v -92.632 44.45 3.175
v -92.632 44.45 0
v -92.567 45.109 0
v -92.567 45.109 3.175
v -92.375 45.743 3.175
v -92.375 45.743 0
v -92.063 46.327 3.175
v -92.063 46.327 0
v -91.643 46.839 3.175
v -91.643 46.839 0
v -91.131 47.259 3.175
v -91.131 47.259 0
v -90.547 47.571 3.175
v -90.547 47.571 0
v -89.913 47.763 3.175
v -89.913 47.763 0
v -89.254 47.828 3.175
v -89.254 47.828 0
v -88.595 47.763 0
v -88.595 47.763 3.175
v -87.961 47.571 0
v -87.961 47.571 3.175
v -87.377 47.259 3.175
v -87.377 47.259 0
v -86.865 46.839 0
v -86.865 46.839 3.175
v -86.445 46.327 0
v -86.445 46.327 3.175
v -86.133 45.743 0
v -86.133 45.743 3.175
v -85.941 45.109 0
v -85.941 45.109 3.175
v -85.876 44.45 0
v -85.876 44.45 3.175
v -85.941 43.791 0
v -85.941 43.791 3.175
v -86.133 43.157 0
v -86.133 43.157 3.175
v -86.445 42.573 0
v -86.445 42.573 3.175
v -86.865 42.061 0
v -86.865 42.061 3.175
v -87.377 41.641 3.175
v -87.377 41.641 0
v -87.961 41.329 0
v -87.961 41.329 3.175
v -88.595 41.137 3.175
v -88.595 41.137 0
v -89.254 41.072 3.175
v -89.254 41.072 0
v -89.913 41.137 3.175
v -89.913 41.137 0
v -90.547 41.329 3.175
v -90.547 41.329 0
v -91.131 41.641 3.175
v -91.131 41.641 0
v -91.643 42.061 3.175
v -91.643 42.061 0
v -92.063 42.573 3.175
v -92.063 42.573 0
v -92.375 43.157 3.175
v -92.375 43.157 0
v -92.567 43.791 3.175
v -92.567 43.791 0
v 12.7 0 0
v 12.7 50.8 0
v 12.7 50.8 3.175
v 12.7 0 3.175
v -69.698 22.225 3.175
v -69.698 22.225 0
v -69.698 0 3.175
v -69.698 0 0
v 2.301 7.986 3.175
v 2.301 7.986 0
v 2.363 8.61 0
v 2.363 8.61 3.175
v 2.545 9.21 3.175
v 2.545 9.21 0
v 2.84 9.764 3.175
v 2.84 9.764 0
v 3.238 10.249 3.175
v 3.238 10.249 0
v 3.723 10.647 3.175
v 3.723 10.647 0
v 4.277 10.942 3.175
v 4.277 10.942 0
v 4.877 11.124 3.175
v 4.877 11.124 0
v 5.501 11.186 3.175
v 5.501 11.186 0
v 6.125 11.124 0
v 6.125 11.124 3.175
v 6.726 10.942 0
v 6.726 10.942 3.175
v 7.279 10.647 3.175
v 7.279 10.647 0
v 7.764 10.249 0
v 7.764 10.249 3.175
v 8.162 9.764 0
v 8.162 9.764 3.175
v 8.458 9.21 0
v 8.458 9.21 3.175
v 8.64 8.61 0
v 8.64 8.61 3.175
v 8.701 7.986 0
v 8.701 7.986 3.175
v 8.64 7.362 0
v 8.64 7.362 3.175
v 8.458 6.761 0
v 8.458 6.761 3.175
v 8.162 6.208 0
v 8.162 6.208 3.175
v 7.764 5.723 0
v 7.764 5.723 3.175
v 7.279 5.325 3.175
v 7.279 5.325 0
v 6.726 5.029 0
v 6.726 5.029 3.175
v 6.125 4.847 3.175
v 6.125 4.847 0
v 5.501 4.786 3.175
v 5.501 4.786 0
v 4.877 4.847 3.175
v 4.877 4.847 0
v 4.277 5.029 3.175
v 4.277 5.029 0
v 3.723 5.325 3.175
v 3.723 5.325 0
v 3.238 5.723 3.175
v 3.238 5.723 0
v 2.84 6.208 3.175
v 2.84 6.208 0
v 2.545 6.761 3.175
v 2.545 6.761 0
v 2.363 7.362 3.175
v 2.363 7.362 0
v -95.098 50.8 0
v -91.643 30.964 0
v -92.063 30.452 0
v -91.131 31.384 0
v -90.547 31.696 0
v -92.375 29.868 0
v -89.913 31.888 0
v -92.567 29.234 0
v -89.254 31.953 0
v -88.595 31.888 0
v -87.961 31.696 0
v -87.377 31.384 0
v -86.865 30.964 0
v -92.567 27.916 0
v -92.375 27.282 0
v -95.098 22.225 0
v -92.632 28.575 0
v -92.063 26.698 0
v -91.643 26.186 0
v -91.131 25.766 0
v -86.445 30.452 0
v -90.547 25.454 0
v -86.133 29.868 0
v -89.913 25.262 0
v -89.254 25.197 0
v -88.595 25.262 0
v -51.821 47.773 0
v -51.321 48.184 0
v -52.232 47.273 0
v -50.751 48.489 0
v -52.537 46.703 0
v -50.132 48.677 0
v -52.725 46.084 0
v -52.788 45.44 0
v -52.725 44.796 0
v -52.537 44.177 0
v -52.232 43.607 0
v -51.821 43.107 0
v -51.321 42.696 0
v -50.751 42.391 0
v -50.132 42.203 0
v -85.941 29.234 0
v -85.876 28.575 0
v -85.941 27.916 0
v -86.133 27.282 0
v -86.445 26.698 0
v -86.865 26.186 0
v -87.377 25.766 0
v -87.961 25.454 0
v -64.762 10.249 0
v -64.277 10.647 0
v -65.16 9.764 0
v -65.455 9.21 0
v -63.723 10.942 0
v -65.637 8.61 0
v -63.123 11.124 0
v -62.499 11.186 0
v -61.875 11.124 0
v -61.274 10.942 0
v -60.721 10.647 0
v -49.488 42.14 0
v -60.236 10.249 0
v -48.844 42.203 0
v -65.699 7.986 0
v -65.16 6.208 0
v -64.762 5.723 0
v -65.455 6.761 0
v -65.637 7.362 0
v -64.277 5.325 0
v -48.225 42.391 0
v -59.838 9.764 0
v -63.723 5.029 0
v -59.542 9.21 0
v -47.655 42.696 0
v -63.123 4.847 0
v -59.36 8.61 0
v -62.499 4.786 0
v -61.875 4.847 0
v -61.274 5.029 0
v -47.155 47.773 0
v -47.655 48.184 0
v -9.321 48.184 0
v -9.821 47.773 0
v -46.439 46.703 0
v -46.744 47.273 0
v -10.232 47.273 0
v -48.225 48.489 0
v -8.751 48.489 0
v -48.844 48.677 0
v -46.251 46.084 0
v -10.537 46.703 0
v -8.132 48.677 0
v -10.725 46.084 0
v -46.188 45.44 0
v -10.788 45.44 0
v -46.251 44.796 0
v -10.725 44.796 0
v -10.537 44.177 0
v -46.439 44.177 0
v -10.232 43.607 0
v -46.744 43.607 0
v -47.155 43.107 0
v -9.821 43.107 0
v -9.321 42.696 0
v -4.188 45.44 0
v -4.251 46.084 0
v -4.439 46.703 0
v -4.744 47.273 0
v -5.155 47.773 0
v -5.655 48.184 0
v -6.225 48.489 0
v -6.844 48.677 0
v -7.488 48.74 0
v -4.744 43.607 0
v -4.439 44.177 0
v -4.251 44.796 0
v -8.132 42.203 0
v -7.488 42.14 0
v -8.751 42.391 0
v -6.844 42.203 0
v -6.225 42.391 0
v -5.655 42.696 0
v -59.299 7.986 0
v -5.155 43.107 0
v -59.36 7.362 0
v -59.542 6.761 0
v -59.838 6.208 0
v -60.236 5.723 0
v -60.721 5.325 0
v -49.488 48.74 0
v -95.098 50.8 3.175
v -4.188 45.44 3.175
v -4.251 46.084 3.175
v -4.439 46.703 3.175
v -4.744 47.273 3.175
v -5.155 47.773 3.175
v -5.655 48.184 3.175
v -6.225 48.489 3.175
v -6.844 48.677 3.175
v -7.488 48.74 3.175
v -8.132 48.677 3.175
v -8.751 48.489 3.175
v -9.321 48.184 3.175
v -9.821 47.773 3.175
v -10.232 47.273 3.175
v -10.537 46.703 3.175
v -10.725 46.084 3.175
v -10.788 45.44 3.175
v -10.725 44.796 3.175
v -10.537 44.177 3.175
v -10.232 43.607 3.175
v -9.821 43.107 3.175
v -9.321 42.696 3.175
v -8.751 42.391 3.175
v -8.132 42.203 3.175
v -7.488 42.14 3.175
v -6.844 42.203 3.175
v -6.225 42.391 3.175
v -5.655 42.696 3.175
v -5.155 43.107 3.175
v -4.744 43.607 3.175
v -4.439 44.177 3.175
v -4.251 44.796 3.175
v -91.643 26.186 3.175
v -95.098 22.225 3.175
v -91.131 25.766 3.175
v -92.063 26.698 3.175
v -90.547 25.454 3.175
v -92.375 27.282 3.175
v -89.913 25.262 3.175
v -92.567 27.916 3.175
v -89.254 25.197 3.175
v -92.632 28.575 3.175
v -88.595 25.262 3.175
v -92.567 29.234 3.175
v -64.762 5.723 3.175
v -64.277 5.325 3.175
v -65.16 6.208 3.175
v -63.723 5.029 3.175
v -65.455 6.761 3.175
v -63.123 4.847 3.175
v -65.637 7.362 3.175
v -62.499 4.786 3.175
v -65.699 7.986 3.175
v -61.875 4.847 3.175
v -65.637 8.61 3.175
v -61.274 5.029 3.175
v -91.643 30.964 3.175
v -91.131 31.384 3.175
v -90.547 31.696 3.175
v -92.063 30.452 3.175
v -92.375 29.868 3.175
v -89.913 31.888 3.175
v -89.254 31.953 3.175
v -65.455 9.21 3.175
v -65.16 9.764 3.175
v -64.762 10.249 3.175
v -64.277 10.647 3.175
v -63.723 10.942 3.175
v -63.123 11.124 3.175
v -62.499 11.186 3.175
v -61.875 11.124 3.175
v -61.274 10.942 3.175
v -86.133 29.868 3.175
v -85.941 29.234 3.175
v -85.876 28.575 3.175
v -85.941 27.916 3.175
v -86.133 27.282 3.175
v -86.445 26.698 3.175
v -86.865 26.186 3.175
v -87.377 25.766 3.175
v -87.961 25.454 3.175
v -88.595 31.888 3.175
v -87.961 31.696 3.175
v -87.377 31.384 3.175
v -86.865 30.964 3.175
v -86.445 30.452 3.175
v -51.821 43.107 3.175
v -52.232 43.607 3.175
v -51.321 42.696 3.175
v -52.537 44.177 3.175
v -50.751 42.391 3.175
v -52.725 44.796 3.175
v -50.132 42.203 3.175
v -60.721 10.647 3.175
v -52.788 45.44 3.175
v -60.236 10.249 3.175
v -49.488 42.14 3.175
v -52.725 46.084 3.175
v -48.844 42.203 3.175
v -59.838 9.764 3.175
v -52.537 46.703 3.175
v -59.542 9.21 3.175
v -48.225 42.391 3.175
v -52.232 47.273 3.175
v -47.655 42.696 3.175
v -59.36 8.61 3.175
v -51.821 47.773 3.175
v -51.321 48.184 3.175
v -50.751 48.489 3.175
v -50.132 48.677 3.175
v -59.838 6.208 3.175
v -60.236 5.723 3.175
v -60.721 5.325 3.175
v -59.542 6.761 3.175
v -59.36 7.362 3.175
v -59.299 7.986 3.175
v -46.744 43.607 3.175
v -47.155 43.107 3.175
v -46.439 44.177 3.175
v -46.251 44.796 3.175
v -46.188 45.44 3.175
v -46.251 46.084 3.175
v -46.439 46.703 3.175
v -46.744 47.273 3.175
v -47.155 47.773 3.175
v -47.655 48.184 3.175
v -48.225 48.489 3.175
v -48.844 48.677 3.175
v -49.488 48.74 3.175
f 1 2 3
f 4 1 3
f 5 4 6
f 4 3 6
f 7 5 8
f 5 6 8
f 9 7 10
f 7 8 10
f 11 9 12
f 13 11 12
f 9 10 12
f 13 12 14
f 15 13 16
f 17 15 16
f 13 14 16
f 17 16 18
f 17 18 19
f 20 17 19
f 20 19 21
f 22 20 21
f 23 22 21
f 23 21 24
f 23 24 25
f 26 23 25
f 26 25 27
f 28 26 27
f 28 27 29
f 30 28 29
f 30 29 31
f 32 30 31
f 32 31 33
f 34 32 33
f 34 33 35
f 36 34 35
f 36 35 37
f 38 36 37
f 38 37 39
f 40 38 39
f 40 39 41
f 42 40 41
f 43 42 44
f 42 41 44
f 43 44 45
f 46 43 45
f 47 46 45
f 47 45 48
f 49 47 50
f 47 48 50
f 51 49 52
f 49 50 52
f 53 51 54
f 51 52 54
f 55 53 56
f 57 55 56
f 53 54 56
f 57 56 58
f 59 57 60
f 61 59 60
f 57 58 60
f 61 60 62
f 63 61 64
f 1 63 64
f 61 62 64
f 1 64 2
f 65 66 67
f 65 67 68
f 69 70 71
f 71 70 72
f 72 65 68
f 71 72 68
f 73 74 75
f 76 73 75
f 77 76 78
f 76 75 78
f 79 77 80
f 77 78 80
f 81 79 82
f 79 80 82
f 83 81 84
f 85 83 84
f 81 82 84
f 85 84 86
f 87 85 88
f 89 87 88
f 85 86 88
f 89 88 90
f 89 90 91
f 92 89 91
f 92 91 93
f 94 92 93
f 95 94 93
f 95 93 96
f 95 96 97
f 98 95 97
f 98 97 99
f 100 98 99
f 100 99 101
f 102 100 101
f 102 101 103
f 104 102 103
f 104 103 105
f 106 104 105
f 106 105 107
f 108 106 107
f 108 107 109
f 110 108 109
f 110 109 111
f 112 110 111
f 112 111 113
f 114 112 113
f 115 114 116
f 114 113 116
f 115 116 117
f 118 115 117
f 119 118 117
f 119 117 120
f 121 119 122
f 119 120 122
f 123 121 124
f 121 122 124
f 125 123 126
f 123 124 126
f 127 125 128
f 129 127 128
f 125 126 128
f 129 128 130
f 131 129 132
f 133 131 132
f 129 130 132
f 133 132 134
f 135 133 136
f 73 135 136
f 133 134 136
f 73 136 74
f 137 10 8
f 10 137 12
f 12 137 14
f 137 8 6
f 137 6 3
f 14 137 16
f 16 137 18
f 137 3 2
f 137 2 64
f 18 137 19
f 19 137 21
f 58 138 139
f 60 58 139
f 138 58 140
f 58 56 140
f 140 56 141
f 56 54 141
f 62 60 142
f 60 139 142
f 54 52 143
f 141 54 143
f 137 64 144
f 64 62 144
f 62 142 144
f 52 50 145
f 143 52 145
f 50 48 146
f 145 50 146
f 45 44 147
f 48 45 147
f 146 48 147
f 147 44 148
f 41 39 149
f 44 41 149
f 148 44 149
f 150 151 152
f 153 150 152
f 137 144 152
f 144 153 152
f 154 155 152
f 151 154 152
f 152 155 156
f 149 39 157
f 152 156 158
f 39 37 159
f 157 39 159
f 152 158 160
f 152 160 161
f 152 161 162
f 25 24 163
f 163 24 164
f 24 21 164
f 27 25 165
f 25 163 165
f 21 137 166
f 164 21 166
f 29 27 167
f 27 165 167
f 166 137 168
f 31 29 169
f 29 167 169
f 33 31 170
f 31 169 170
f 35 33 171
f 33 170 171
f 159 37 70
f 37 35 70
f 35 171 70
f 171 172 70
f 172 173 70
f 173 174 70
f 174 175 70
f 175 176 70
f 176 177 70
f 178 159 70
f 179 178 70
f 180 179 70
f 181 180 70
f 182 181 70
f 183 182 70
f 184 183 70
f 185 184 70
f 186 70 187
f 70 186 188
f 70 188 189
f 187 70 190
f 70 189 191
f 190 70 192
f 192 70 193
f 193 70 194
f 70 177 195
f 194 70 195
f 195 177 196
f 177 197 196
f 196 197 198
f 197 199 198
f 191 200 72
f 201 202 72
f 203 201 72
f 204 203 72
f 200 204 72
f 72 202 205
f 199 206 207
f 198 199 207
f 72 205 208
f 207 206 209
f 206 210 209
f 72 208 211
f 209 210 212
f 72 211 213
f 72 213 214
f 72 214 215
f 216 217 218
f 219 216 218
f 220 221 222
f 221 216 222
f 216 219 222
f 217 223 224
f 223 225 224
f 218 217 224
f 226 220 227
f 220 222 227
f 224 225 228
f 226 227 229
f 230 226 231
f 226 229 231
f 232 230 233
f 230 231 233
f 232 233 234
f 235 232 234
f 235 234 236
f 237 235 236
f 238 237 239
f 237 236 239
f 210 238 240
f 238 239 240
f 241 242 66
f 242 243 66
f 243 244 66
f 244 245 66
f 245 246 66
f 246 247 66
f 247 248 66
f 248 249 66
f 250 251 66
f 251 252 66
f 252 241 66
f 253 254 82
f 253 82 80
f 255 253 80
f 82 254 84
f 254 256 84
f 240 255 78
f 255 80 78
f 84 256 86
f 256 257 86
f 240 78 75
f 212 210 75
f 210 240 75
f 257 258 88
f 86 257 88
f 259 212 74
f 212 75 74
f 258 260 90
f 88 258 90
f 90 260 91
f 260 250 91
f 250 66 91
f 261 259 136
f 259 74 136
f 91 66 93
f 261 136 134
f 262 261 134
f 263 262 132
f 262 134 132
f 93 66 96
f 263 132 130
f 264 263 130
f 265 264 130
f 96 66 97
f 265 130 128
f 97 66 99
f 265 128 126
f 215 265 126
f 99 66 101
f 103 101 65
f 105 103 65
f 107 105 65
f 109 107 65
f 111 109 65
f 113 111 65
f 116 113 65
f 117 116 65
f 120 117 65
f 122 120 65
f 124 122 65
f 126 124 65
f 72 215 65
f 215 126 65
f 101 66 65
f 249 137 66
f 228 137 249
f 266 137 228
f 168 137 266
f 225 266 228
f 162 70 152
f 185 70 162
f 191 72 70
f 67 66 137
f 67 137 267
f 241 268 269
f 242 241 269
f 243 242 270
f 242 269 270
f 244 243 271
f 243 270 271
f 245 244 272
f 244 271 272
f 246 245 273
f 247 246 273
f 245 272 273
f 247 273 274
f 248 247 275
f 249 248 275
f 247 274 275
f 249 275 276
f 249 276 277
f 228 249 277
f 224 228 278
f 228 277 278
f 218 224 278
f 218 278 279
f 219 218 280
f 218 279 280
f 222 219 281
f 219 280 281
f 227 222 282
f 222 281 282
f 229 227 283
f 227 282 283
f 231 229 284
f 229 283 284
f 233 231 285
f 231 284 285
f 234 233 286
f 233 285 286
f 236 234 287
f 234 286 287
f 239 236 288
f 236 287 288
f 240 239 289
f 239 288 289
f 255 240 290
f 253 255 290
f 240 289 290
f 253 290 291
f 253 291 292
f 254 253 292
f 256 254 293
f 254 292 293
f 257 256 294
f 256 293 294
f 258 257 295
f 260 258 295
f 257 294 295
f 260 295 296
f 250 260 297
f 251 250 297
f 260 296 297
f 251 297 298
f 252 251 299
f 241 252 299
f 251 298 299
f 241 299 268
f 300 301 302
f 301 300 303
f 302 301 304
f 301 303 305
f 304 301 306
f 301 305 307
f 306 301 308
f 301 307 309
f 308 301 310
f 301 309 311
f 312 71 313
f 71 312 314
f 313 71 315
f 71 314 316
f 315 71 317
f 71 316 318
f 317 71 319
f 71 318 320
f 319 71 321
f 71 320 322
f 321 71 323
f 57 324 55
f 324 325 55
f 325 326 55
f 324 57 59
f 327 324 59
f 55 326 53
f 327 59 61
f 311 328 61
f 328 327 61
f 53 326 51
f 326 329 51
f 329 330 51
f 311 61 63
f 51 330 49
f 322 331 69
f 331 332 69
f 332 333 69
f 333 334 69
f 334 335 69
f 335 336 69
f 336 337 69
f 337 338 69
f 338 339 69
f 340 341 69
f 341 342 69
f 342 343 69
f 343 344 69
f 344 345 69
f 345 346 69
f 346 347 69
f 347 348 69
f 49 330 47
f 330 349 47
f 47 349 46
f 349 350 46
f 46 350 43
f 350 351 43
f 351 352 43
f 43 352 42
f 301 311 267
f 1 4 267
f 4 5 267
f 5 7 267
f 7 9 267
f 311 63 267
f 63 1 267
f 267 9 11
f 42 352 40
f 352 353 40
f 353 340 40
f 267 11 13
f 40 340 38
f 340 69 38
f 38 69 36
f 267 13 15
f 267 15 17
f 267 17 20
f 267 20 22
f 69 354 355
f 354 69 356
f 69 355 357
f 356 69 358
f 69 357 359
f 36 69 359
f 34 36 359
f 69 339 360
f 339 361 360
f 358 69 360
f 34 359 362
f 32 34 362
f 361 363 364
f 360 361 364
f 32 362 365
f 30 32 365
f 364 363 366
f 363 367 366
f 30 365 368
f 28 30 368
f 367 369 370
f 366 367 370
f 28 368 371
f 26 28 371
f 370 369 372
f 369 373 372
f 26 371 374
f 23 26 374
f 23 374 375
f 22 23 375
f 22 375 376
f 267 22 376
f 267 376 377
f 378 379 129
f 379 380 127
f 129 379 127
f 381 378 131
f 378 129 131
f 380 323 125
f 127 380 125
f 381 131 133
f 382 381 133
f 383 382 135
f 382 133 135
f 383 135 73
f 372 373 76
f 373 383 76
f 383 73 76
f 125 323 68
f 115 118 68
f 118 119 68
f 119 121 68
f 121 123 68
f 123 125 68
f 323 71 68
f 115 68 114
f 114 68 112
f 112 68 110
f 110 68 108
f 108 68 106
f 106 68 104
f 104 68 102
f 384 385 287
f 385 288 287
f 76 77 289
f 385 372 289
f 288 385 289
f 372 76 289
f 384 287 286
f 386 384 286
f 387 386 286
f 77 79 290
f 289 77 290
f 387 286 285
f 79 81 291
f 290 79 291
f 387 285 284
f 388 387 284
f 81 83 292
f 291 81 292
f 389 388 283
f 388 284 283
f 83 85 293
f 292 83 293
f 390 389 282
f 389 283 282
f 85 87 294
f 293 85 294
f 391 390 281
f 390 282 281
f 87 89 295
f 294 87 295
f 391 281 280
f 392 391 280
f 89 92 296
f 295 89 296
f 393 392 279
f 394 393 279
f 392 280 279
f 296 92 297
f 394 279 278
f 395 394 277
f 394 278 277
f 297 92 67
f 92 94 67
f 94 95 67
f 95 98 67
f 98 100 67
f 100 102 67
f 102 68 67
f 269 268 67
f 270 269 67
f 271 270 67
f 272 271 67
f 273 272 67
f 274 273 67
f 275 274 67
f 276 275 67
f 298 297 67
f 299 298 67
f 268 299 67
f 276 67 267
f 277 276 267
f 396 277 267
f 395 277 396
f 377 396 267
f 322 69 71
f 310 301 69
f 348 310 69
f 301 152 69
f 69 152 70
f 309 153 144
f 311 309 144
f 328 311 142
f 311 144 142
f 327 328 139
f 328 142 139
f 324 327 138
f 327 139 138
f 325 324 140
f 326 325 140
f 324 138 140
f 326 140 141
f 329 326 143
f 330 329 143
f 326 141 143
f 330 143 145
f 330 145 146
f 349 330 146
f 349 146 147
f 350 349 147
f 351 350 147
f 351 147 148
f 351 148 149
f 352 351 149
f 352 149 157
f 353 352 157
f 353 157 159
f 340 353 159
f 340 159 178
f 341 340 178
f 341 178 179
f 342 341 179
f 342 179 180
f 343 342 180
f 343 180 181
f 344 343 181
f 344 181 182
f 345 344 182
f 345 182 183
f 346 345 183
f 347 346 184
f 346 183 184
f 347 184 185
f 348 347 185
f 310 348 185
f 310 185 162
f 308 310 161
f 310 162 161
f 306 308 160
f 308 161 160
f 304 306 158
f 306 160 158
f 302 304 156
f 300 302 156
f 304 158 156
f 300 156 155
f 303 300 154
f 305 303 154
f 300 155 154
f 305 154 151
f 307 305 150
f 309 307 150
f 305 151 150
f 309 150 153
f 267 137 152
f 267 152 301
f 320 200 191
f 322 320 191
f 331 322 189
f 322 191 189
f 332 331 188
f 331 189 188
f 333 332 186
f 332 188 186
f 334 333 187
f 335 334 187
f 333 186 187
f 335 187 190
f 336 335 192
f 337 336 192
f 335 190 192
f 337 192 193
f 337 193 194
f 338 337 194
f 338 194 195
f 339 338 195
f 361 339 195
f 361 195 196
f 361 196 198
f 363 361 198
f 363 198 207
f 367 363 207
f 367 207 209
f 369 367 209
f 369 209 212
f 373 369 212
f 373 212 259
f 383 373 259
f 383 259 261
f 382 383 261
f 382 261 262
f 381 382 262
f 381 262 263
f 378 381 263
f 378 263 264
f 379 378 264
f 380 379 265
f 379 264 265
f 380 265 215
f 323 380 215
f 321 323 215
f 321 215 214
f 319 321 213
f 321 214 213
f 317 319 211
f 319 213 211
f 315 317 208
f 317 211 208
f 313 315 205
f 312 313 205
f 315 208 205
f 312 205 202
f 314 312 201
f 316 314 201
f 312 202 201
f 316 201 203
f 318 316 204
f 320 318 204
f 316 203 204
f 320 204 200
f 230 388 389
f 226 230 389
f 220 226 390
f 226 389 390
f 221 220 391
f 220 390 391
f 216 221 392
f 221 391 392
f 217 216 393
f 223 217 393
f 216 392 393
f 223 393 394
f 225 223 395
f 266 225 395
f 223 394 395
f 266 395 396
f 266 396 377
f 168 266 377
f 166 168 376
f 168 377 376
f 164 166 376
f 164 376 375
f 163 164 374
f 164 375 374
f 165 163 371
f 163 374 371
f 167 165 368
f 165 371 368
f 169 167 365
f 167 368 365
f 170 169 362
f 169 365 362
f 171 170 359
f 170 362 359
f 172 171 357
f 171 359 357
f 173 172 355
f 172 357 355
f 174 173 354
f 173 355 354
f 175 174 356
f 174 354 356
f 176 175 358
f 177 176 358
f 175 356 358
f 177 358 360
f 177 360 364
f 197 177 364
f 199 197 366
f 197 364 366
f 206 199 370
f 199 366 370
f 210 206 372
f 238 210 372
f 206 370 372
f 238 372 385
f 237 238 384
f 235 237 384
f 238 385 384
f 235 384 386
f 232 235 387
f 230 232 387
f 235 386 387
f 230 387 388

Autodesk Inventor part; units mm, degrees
ref_plane "YZ Plane" through (0, 0, 0) normal (1, 0, 0) x (0, 1, 0)
ref_plane "XZ Plane" through (0, 0, 0) normal (0, 1, 0) x (-1, 0, 0)
ref_plane "XY Plane" through (0, 0, 0) normal (0, 0, 1) x (1, 0, 0)
sketch "Sketch1" plane through (0, 0, 0) normal (0, 0, 1) x (1, 0, 0)
  line L0 (0, 0) -> (-56.9976, 0)
  line L1 (-56.9976, 50.8) -> (0, 50.8)
  line L2 (0, 50.8) -> (-7.493, 50.8)
  line L3 (-7.493, 50.8) -> (-7.493, 44.45)
  line L4 (-56.9976, 50.8) -> (-49.5046, 50.8)
  line L5 (-49.5046, 50.8) -> (-49.5046, 44.45)
  line L6 (-56.9976, 50.8) -> (-69.6976, 50.8)
  line L7 (-69.6976, 50.8) -> (-69.6976, 0)
  line L8 (-69.6976, 0) -> (-56.9976, 0)
  line L9 (0, 50.8) -> (8.89, 50.8)
  line L10 (8.89, 0) -> (0, 0)
  line L11 (0, 50.8) -> (12.7, 50.8)
  line L12 (12.7, 50.8) -> (12.7, 0)
  line L13 (12.7, 0) -> (0, 0)
  dimension "d1" = 56.9976
  dimension "d2" = 50.8
  dimension "d3" = 7.493
  dimension "d4" = 6.35
  dimension "d5" = 7.493
  dimension "d19" = 6.35
  dimension "d48" = 12.7
  dimension "d51" = 50.8
  dimension "d57" = 12.7
extrude "Plate5" add sketch "Sketch1" along normal blind 3.175
sketch "Sketch6" plane through (0, 0, 3.175) normal (0, 0, 1) x (1, 0, 0)
  circle A0 centre (-7.488, 45.44) radius 3.3 projected
  circle A1 centre (-49.488, 45.44) radius 3.3 projected
  point P0 (0, 0)
extrude "Cut1" cut sketch "Sketch6" against normal blind 3.175
sketch "Sketch7" plane through (12.7, 0, 0) normal (1, 0, 0) x (0, 0, -1)
  line L0 (-3.175, 50.8) -> (-3.175, 0) projected
  line L1 (0, 0) -> (-3.175, 0) projected
  line L2 (0, 0) -> (0, 50.8) projected
  line L3 (0, 50.8) -> (-3.175, 50.8) projected
sketch "Sketch8" plane through (0, 0, 0) normal (0, 0, -1) x (-1, 0, 0)
  circle A0 centre (-5.5012, 7.9858) radius 3.2
  circle A1 centre (62.4988, 7.9858) radius 3.2
  point P0 (0, 0)
extrude "Cut2" cut sketch "Sketch8" against normal blind 3.175
sketch "Sketch12" plane through (-69.6976, 0, 0) normal (-1, 0, 0) x (0, 0, 1)
  line L0 (3.175, 0) -> (3.175, 50.8) projected
  line L1 (0, 50.8) -> (3.175, 50.8) projected
  line L2 (0, 50.8) -> (0, 0) projected
  line L3 (0, 0) -> (3.175, 0) projected
extrude "Extrusion3" add sketch "Sketch12" along normal blind 25.4
sketch "Sketch10" plane through (0, 0, 0) normal (0, 0, -1) x (-1, 0, 0)
  line L0 (69.6976, 0) -> (-12.7, 0) projected
  line L1 (107.7976, 22.225) -> (69.6976, 22.225)
  line L2 (69.6976, 22.225) -> (69.6976, 0)
  circle A0 centre (89.254, 44.45) radius 3.3782 projected
  circle A1 centre (89.254, 28.575) radius 3.3782 projected
  line L3 (69.6976, 0) -> (95.0976, 0)
  line L4 (95.0976, 0) -> (95.0976, 22.225)
  point P0 (0, 0)
  dimension "d67" = 38.1
  dimension "d72" = 25.4
extrude "Extrusion4" cut sketch "Sketch10" against normal blind 25.4
equation "\"d60\" = Thickness"
equation "\"d62\" = Thickness"
equation "\"BendRadius\" = Thickness"
equation "\"BendReliefWidth\" = Thickness"
equation "\"BendReliefDepth\" = 0.5 * Thickness"
equation "\"CornerReliefSize\" = 4 * Thickness"
equation "\"MinimumRemnant\" = 2 * Thickness"
equation "\"TransitionRadius\" = BendRadius"
equation "\"JacobiRadiusSize\" = BendRadius"
equation "\"GapSize\" = Thickness"
equation "\"d8\" = BendRadius"
equation "\"d56\" = BendRadius"
equation "\"Thickness\" = 3.175"
properties part number "face mount" material "Aluminum 6061"
